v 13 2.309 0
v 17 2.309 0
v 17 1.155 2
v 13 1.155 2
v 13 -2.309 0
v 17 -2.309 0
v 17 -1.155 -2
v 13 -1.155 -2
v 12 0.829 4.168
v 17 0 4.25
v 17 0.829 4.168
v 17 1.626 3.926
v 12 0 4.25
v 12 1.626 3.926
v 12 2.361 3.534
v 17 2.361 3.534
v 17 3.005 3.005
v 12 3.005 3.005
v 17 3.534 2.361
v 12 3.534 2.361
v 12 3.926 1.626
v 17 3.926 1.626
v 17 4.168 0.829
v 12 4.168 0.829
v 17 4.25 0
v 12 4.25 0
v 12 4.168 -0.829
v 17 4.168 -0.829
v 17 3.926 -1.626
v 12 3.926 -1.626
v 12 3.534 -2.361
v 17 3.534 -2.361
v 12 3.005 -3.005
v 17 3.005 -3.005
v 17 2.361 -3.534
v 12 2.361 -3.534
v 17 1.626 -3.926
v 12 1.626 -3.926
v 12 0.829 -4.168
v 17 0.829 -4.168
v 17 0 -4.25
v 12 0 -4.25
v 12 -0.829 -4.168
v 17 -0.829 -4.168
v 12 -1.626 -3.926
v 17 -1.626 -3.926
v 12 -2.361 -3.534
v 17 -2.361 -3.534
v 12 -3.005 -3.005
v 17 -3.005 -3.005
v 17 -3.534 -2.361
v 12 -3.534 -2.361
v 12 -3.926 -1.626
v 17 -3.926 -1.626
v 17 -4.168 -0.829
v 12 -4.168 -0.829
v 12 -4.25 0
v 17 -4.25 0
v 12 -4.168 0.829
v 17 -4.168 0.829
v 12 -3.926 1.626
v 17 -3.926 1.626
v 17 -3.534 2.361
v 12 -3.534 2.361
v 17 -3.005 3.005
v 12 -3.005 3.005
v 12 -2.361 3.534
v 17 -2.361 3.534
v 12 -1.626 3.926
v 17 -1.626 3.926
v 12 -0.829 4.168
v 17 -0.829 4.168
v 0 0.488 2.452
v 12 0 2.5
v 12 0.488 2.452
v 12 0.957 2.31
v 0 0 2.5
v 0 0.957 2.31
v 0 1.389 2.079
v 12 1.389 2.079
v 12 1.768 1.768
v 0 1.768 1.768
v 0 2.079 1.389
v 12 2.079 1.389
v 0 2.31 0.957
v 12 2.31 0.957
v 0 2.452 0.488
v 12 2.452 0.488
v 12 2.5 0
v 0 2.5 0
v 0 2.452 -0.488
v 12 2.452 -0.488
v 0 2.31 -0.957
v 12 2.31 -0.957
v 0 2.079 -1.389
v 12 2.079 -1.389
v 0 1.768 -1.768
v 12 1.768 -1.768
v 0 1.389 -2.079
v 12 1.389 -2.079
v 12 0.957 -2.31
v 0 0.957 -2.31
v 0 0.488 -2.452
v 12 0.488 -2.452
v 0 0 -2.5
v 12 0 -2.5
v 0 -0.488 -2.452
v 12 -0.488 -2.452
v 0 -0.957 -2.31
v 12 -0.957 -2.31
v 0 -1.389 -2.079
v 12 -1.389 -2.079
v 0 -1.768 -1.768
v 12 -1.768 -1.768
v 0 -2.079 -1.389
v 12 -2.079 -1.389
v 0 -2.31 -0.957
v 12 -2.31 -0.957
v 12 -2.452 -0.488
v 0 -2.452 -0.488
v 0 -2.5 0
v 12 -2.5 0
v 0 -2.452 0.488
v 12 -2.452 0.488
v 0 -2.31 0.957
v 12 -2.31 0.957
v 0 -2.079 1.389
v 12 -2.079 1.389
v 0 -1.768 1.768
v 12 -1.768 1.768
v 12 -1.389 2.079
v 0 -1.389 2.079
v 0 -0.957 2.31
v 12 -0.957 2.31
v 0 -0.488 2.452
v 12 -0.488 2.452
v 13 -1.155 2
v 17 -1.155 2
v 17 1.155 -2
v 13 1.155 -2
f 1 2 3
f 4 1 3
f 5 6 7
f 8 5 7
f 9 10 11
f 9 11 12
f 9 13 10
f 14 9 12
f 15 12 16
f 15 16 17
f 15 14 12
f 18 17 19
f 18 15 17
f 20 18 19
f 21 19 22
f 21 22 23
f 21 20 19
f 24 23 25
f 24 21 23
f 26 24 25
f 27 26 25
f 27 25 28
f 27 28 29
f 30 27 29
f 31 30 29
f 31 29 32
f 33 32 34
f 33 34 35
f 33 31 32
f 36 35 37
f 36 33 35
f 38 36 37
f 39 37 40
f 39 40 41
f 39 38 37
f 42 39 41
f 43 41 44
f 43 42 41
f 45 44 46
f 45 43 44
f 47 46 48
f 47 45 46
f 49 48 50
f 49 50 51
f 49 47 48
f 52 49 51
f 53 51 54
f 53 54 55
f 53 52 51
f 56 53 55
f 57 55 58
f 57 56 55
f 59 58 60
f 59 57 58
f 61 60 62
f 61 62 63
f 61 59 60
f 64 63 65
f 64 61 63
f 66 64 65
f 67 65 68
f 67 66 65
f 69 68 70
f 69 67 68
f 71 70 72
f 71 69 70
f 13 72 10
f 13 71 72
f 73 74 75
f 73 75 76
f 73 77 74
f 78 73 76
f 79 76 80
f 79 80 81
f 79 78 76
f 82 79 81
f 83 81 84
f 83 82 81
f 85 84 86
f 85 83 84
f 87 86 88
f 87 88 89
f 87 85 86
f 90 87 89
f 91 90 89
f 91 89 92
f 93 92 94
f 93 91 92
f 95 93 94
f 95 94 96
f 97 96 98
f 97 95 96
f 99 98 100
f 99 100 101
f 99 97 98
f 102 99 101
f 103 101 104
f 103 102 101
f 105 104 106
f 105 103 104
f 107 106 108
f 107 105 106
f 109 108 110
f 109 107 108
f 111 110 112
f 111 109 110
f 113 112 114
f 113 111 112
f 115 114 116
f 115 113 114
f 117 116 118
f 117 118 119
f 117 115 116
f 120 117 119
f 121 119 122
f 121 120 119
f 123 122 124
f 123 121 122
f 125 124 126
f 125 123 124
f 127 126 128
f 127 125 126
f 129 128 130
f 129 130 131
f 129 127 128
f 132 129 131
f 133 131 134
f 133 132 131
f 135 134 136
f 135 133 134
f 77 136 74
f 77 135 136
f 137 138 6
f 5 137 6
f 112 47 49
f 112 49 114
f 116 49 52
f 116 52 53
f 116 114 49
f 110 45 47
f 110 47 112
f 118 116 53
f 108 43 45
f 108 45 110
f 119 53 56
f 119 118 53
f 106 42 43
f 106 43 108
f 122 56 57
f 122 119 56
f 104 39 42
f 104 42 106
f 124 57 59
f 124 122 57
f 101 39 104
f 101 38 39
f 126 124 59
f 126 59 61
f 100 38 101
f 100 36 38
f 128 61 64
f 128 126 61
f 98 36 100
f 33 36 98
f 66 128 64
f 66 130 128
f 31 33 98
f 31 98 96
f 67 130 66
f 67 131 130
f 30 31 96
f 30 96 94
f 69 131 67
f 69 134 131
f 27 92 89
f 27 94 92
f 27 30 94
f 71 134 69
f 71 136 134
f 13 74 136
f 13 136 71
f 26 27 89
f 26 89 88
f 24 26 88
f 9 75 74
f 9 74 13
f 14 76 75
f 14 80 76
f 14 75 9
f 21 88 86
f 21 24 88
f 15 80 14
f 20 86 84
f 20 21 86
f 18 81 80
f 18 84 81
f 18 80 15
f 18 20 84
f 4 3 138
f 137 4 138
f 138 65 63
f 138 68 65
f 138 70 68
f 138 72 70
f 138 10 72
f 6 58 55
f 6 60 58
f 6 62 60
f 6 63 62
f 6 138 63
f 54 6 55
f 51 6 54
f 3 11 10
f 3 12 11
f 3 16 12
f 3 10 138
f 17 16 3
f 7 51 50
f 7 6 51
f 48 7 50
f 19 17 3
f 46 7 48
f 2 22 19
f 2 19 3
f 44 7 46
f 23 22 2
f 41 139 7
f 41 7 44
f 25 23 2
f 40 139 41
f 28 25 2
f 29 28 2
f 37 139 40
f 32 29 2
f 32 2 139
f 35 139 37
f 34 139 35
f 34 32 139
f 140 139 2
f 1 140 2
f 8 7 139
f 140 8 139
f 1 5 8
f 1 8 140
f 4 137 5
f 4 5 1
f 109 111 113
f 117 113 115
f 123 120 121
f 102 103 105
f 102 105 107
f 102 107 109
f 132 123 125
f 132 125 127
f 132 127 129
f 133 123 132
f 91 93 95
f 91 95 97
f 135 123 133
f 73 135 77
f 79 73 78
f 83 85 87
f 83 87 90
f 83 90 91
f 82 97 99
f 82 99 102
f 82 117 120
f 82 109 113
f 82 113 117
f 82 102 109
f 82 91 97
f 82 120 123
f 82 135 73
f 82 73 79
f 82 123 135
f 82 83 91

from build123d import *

# Parameters (mm, degrees)
F3_DEPTH = 4


with BuildPart() as f1:
    # F0 (on Front) → F1 (revolve)
    with BuildSketch(Plane.XZ):
        Polygon((0, 2.5), (0, 0), (17, 0), (17, 4.25), (12, 4.25), (12, 2.5), align=None)
    revolve(axis=Axis((8.5, 0, 0), (-1, 0, 0)))

    # F2 (on face) → F3 (cut)
    with BuildSketch(Plane.YZ.offset(17)):
        Polygon((1.154701, 2), (-1.154701, 2), (-2.309401, 0), (-1.154701, -2), (1.154701, -2), (2.309401, 0), align=None)
    extrude(amount=-F3_DEPTH, mode=Mode.SUBTRACT)


solid = f1.part
